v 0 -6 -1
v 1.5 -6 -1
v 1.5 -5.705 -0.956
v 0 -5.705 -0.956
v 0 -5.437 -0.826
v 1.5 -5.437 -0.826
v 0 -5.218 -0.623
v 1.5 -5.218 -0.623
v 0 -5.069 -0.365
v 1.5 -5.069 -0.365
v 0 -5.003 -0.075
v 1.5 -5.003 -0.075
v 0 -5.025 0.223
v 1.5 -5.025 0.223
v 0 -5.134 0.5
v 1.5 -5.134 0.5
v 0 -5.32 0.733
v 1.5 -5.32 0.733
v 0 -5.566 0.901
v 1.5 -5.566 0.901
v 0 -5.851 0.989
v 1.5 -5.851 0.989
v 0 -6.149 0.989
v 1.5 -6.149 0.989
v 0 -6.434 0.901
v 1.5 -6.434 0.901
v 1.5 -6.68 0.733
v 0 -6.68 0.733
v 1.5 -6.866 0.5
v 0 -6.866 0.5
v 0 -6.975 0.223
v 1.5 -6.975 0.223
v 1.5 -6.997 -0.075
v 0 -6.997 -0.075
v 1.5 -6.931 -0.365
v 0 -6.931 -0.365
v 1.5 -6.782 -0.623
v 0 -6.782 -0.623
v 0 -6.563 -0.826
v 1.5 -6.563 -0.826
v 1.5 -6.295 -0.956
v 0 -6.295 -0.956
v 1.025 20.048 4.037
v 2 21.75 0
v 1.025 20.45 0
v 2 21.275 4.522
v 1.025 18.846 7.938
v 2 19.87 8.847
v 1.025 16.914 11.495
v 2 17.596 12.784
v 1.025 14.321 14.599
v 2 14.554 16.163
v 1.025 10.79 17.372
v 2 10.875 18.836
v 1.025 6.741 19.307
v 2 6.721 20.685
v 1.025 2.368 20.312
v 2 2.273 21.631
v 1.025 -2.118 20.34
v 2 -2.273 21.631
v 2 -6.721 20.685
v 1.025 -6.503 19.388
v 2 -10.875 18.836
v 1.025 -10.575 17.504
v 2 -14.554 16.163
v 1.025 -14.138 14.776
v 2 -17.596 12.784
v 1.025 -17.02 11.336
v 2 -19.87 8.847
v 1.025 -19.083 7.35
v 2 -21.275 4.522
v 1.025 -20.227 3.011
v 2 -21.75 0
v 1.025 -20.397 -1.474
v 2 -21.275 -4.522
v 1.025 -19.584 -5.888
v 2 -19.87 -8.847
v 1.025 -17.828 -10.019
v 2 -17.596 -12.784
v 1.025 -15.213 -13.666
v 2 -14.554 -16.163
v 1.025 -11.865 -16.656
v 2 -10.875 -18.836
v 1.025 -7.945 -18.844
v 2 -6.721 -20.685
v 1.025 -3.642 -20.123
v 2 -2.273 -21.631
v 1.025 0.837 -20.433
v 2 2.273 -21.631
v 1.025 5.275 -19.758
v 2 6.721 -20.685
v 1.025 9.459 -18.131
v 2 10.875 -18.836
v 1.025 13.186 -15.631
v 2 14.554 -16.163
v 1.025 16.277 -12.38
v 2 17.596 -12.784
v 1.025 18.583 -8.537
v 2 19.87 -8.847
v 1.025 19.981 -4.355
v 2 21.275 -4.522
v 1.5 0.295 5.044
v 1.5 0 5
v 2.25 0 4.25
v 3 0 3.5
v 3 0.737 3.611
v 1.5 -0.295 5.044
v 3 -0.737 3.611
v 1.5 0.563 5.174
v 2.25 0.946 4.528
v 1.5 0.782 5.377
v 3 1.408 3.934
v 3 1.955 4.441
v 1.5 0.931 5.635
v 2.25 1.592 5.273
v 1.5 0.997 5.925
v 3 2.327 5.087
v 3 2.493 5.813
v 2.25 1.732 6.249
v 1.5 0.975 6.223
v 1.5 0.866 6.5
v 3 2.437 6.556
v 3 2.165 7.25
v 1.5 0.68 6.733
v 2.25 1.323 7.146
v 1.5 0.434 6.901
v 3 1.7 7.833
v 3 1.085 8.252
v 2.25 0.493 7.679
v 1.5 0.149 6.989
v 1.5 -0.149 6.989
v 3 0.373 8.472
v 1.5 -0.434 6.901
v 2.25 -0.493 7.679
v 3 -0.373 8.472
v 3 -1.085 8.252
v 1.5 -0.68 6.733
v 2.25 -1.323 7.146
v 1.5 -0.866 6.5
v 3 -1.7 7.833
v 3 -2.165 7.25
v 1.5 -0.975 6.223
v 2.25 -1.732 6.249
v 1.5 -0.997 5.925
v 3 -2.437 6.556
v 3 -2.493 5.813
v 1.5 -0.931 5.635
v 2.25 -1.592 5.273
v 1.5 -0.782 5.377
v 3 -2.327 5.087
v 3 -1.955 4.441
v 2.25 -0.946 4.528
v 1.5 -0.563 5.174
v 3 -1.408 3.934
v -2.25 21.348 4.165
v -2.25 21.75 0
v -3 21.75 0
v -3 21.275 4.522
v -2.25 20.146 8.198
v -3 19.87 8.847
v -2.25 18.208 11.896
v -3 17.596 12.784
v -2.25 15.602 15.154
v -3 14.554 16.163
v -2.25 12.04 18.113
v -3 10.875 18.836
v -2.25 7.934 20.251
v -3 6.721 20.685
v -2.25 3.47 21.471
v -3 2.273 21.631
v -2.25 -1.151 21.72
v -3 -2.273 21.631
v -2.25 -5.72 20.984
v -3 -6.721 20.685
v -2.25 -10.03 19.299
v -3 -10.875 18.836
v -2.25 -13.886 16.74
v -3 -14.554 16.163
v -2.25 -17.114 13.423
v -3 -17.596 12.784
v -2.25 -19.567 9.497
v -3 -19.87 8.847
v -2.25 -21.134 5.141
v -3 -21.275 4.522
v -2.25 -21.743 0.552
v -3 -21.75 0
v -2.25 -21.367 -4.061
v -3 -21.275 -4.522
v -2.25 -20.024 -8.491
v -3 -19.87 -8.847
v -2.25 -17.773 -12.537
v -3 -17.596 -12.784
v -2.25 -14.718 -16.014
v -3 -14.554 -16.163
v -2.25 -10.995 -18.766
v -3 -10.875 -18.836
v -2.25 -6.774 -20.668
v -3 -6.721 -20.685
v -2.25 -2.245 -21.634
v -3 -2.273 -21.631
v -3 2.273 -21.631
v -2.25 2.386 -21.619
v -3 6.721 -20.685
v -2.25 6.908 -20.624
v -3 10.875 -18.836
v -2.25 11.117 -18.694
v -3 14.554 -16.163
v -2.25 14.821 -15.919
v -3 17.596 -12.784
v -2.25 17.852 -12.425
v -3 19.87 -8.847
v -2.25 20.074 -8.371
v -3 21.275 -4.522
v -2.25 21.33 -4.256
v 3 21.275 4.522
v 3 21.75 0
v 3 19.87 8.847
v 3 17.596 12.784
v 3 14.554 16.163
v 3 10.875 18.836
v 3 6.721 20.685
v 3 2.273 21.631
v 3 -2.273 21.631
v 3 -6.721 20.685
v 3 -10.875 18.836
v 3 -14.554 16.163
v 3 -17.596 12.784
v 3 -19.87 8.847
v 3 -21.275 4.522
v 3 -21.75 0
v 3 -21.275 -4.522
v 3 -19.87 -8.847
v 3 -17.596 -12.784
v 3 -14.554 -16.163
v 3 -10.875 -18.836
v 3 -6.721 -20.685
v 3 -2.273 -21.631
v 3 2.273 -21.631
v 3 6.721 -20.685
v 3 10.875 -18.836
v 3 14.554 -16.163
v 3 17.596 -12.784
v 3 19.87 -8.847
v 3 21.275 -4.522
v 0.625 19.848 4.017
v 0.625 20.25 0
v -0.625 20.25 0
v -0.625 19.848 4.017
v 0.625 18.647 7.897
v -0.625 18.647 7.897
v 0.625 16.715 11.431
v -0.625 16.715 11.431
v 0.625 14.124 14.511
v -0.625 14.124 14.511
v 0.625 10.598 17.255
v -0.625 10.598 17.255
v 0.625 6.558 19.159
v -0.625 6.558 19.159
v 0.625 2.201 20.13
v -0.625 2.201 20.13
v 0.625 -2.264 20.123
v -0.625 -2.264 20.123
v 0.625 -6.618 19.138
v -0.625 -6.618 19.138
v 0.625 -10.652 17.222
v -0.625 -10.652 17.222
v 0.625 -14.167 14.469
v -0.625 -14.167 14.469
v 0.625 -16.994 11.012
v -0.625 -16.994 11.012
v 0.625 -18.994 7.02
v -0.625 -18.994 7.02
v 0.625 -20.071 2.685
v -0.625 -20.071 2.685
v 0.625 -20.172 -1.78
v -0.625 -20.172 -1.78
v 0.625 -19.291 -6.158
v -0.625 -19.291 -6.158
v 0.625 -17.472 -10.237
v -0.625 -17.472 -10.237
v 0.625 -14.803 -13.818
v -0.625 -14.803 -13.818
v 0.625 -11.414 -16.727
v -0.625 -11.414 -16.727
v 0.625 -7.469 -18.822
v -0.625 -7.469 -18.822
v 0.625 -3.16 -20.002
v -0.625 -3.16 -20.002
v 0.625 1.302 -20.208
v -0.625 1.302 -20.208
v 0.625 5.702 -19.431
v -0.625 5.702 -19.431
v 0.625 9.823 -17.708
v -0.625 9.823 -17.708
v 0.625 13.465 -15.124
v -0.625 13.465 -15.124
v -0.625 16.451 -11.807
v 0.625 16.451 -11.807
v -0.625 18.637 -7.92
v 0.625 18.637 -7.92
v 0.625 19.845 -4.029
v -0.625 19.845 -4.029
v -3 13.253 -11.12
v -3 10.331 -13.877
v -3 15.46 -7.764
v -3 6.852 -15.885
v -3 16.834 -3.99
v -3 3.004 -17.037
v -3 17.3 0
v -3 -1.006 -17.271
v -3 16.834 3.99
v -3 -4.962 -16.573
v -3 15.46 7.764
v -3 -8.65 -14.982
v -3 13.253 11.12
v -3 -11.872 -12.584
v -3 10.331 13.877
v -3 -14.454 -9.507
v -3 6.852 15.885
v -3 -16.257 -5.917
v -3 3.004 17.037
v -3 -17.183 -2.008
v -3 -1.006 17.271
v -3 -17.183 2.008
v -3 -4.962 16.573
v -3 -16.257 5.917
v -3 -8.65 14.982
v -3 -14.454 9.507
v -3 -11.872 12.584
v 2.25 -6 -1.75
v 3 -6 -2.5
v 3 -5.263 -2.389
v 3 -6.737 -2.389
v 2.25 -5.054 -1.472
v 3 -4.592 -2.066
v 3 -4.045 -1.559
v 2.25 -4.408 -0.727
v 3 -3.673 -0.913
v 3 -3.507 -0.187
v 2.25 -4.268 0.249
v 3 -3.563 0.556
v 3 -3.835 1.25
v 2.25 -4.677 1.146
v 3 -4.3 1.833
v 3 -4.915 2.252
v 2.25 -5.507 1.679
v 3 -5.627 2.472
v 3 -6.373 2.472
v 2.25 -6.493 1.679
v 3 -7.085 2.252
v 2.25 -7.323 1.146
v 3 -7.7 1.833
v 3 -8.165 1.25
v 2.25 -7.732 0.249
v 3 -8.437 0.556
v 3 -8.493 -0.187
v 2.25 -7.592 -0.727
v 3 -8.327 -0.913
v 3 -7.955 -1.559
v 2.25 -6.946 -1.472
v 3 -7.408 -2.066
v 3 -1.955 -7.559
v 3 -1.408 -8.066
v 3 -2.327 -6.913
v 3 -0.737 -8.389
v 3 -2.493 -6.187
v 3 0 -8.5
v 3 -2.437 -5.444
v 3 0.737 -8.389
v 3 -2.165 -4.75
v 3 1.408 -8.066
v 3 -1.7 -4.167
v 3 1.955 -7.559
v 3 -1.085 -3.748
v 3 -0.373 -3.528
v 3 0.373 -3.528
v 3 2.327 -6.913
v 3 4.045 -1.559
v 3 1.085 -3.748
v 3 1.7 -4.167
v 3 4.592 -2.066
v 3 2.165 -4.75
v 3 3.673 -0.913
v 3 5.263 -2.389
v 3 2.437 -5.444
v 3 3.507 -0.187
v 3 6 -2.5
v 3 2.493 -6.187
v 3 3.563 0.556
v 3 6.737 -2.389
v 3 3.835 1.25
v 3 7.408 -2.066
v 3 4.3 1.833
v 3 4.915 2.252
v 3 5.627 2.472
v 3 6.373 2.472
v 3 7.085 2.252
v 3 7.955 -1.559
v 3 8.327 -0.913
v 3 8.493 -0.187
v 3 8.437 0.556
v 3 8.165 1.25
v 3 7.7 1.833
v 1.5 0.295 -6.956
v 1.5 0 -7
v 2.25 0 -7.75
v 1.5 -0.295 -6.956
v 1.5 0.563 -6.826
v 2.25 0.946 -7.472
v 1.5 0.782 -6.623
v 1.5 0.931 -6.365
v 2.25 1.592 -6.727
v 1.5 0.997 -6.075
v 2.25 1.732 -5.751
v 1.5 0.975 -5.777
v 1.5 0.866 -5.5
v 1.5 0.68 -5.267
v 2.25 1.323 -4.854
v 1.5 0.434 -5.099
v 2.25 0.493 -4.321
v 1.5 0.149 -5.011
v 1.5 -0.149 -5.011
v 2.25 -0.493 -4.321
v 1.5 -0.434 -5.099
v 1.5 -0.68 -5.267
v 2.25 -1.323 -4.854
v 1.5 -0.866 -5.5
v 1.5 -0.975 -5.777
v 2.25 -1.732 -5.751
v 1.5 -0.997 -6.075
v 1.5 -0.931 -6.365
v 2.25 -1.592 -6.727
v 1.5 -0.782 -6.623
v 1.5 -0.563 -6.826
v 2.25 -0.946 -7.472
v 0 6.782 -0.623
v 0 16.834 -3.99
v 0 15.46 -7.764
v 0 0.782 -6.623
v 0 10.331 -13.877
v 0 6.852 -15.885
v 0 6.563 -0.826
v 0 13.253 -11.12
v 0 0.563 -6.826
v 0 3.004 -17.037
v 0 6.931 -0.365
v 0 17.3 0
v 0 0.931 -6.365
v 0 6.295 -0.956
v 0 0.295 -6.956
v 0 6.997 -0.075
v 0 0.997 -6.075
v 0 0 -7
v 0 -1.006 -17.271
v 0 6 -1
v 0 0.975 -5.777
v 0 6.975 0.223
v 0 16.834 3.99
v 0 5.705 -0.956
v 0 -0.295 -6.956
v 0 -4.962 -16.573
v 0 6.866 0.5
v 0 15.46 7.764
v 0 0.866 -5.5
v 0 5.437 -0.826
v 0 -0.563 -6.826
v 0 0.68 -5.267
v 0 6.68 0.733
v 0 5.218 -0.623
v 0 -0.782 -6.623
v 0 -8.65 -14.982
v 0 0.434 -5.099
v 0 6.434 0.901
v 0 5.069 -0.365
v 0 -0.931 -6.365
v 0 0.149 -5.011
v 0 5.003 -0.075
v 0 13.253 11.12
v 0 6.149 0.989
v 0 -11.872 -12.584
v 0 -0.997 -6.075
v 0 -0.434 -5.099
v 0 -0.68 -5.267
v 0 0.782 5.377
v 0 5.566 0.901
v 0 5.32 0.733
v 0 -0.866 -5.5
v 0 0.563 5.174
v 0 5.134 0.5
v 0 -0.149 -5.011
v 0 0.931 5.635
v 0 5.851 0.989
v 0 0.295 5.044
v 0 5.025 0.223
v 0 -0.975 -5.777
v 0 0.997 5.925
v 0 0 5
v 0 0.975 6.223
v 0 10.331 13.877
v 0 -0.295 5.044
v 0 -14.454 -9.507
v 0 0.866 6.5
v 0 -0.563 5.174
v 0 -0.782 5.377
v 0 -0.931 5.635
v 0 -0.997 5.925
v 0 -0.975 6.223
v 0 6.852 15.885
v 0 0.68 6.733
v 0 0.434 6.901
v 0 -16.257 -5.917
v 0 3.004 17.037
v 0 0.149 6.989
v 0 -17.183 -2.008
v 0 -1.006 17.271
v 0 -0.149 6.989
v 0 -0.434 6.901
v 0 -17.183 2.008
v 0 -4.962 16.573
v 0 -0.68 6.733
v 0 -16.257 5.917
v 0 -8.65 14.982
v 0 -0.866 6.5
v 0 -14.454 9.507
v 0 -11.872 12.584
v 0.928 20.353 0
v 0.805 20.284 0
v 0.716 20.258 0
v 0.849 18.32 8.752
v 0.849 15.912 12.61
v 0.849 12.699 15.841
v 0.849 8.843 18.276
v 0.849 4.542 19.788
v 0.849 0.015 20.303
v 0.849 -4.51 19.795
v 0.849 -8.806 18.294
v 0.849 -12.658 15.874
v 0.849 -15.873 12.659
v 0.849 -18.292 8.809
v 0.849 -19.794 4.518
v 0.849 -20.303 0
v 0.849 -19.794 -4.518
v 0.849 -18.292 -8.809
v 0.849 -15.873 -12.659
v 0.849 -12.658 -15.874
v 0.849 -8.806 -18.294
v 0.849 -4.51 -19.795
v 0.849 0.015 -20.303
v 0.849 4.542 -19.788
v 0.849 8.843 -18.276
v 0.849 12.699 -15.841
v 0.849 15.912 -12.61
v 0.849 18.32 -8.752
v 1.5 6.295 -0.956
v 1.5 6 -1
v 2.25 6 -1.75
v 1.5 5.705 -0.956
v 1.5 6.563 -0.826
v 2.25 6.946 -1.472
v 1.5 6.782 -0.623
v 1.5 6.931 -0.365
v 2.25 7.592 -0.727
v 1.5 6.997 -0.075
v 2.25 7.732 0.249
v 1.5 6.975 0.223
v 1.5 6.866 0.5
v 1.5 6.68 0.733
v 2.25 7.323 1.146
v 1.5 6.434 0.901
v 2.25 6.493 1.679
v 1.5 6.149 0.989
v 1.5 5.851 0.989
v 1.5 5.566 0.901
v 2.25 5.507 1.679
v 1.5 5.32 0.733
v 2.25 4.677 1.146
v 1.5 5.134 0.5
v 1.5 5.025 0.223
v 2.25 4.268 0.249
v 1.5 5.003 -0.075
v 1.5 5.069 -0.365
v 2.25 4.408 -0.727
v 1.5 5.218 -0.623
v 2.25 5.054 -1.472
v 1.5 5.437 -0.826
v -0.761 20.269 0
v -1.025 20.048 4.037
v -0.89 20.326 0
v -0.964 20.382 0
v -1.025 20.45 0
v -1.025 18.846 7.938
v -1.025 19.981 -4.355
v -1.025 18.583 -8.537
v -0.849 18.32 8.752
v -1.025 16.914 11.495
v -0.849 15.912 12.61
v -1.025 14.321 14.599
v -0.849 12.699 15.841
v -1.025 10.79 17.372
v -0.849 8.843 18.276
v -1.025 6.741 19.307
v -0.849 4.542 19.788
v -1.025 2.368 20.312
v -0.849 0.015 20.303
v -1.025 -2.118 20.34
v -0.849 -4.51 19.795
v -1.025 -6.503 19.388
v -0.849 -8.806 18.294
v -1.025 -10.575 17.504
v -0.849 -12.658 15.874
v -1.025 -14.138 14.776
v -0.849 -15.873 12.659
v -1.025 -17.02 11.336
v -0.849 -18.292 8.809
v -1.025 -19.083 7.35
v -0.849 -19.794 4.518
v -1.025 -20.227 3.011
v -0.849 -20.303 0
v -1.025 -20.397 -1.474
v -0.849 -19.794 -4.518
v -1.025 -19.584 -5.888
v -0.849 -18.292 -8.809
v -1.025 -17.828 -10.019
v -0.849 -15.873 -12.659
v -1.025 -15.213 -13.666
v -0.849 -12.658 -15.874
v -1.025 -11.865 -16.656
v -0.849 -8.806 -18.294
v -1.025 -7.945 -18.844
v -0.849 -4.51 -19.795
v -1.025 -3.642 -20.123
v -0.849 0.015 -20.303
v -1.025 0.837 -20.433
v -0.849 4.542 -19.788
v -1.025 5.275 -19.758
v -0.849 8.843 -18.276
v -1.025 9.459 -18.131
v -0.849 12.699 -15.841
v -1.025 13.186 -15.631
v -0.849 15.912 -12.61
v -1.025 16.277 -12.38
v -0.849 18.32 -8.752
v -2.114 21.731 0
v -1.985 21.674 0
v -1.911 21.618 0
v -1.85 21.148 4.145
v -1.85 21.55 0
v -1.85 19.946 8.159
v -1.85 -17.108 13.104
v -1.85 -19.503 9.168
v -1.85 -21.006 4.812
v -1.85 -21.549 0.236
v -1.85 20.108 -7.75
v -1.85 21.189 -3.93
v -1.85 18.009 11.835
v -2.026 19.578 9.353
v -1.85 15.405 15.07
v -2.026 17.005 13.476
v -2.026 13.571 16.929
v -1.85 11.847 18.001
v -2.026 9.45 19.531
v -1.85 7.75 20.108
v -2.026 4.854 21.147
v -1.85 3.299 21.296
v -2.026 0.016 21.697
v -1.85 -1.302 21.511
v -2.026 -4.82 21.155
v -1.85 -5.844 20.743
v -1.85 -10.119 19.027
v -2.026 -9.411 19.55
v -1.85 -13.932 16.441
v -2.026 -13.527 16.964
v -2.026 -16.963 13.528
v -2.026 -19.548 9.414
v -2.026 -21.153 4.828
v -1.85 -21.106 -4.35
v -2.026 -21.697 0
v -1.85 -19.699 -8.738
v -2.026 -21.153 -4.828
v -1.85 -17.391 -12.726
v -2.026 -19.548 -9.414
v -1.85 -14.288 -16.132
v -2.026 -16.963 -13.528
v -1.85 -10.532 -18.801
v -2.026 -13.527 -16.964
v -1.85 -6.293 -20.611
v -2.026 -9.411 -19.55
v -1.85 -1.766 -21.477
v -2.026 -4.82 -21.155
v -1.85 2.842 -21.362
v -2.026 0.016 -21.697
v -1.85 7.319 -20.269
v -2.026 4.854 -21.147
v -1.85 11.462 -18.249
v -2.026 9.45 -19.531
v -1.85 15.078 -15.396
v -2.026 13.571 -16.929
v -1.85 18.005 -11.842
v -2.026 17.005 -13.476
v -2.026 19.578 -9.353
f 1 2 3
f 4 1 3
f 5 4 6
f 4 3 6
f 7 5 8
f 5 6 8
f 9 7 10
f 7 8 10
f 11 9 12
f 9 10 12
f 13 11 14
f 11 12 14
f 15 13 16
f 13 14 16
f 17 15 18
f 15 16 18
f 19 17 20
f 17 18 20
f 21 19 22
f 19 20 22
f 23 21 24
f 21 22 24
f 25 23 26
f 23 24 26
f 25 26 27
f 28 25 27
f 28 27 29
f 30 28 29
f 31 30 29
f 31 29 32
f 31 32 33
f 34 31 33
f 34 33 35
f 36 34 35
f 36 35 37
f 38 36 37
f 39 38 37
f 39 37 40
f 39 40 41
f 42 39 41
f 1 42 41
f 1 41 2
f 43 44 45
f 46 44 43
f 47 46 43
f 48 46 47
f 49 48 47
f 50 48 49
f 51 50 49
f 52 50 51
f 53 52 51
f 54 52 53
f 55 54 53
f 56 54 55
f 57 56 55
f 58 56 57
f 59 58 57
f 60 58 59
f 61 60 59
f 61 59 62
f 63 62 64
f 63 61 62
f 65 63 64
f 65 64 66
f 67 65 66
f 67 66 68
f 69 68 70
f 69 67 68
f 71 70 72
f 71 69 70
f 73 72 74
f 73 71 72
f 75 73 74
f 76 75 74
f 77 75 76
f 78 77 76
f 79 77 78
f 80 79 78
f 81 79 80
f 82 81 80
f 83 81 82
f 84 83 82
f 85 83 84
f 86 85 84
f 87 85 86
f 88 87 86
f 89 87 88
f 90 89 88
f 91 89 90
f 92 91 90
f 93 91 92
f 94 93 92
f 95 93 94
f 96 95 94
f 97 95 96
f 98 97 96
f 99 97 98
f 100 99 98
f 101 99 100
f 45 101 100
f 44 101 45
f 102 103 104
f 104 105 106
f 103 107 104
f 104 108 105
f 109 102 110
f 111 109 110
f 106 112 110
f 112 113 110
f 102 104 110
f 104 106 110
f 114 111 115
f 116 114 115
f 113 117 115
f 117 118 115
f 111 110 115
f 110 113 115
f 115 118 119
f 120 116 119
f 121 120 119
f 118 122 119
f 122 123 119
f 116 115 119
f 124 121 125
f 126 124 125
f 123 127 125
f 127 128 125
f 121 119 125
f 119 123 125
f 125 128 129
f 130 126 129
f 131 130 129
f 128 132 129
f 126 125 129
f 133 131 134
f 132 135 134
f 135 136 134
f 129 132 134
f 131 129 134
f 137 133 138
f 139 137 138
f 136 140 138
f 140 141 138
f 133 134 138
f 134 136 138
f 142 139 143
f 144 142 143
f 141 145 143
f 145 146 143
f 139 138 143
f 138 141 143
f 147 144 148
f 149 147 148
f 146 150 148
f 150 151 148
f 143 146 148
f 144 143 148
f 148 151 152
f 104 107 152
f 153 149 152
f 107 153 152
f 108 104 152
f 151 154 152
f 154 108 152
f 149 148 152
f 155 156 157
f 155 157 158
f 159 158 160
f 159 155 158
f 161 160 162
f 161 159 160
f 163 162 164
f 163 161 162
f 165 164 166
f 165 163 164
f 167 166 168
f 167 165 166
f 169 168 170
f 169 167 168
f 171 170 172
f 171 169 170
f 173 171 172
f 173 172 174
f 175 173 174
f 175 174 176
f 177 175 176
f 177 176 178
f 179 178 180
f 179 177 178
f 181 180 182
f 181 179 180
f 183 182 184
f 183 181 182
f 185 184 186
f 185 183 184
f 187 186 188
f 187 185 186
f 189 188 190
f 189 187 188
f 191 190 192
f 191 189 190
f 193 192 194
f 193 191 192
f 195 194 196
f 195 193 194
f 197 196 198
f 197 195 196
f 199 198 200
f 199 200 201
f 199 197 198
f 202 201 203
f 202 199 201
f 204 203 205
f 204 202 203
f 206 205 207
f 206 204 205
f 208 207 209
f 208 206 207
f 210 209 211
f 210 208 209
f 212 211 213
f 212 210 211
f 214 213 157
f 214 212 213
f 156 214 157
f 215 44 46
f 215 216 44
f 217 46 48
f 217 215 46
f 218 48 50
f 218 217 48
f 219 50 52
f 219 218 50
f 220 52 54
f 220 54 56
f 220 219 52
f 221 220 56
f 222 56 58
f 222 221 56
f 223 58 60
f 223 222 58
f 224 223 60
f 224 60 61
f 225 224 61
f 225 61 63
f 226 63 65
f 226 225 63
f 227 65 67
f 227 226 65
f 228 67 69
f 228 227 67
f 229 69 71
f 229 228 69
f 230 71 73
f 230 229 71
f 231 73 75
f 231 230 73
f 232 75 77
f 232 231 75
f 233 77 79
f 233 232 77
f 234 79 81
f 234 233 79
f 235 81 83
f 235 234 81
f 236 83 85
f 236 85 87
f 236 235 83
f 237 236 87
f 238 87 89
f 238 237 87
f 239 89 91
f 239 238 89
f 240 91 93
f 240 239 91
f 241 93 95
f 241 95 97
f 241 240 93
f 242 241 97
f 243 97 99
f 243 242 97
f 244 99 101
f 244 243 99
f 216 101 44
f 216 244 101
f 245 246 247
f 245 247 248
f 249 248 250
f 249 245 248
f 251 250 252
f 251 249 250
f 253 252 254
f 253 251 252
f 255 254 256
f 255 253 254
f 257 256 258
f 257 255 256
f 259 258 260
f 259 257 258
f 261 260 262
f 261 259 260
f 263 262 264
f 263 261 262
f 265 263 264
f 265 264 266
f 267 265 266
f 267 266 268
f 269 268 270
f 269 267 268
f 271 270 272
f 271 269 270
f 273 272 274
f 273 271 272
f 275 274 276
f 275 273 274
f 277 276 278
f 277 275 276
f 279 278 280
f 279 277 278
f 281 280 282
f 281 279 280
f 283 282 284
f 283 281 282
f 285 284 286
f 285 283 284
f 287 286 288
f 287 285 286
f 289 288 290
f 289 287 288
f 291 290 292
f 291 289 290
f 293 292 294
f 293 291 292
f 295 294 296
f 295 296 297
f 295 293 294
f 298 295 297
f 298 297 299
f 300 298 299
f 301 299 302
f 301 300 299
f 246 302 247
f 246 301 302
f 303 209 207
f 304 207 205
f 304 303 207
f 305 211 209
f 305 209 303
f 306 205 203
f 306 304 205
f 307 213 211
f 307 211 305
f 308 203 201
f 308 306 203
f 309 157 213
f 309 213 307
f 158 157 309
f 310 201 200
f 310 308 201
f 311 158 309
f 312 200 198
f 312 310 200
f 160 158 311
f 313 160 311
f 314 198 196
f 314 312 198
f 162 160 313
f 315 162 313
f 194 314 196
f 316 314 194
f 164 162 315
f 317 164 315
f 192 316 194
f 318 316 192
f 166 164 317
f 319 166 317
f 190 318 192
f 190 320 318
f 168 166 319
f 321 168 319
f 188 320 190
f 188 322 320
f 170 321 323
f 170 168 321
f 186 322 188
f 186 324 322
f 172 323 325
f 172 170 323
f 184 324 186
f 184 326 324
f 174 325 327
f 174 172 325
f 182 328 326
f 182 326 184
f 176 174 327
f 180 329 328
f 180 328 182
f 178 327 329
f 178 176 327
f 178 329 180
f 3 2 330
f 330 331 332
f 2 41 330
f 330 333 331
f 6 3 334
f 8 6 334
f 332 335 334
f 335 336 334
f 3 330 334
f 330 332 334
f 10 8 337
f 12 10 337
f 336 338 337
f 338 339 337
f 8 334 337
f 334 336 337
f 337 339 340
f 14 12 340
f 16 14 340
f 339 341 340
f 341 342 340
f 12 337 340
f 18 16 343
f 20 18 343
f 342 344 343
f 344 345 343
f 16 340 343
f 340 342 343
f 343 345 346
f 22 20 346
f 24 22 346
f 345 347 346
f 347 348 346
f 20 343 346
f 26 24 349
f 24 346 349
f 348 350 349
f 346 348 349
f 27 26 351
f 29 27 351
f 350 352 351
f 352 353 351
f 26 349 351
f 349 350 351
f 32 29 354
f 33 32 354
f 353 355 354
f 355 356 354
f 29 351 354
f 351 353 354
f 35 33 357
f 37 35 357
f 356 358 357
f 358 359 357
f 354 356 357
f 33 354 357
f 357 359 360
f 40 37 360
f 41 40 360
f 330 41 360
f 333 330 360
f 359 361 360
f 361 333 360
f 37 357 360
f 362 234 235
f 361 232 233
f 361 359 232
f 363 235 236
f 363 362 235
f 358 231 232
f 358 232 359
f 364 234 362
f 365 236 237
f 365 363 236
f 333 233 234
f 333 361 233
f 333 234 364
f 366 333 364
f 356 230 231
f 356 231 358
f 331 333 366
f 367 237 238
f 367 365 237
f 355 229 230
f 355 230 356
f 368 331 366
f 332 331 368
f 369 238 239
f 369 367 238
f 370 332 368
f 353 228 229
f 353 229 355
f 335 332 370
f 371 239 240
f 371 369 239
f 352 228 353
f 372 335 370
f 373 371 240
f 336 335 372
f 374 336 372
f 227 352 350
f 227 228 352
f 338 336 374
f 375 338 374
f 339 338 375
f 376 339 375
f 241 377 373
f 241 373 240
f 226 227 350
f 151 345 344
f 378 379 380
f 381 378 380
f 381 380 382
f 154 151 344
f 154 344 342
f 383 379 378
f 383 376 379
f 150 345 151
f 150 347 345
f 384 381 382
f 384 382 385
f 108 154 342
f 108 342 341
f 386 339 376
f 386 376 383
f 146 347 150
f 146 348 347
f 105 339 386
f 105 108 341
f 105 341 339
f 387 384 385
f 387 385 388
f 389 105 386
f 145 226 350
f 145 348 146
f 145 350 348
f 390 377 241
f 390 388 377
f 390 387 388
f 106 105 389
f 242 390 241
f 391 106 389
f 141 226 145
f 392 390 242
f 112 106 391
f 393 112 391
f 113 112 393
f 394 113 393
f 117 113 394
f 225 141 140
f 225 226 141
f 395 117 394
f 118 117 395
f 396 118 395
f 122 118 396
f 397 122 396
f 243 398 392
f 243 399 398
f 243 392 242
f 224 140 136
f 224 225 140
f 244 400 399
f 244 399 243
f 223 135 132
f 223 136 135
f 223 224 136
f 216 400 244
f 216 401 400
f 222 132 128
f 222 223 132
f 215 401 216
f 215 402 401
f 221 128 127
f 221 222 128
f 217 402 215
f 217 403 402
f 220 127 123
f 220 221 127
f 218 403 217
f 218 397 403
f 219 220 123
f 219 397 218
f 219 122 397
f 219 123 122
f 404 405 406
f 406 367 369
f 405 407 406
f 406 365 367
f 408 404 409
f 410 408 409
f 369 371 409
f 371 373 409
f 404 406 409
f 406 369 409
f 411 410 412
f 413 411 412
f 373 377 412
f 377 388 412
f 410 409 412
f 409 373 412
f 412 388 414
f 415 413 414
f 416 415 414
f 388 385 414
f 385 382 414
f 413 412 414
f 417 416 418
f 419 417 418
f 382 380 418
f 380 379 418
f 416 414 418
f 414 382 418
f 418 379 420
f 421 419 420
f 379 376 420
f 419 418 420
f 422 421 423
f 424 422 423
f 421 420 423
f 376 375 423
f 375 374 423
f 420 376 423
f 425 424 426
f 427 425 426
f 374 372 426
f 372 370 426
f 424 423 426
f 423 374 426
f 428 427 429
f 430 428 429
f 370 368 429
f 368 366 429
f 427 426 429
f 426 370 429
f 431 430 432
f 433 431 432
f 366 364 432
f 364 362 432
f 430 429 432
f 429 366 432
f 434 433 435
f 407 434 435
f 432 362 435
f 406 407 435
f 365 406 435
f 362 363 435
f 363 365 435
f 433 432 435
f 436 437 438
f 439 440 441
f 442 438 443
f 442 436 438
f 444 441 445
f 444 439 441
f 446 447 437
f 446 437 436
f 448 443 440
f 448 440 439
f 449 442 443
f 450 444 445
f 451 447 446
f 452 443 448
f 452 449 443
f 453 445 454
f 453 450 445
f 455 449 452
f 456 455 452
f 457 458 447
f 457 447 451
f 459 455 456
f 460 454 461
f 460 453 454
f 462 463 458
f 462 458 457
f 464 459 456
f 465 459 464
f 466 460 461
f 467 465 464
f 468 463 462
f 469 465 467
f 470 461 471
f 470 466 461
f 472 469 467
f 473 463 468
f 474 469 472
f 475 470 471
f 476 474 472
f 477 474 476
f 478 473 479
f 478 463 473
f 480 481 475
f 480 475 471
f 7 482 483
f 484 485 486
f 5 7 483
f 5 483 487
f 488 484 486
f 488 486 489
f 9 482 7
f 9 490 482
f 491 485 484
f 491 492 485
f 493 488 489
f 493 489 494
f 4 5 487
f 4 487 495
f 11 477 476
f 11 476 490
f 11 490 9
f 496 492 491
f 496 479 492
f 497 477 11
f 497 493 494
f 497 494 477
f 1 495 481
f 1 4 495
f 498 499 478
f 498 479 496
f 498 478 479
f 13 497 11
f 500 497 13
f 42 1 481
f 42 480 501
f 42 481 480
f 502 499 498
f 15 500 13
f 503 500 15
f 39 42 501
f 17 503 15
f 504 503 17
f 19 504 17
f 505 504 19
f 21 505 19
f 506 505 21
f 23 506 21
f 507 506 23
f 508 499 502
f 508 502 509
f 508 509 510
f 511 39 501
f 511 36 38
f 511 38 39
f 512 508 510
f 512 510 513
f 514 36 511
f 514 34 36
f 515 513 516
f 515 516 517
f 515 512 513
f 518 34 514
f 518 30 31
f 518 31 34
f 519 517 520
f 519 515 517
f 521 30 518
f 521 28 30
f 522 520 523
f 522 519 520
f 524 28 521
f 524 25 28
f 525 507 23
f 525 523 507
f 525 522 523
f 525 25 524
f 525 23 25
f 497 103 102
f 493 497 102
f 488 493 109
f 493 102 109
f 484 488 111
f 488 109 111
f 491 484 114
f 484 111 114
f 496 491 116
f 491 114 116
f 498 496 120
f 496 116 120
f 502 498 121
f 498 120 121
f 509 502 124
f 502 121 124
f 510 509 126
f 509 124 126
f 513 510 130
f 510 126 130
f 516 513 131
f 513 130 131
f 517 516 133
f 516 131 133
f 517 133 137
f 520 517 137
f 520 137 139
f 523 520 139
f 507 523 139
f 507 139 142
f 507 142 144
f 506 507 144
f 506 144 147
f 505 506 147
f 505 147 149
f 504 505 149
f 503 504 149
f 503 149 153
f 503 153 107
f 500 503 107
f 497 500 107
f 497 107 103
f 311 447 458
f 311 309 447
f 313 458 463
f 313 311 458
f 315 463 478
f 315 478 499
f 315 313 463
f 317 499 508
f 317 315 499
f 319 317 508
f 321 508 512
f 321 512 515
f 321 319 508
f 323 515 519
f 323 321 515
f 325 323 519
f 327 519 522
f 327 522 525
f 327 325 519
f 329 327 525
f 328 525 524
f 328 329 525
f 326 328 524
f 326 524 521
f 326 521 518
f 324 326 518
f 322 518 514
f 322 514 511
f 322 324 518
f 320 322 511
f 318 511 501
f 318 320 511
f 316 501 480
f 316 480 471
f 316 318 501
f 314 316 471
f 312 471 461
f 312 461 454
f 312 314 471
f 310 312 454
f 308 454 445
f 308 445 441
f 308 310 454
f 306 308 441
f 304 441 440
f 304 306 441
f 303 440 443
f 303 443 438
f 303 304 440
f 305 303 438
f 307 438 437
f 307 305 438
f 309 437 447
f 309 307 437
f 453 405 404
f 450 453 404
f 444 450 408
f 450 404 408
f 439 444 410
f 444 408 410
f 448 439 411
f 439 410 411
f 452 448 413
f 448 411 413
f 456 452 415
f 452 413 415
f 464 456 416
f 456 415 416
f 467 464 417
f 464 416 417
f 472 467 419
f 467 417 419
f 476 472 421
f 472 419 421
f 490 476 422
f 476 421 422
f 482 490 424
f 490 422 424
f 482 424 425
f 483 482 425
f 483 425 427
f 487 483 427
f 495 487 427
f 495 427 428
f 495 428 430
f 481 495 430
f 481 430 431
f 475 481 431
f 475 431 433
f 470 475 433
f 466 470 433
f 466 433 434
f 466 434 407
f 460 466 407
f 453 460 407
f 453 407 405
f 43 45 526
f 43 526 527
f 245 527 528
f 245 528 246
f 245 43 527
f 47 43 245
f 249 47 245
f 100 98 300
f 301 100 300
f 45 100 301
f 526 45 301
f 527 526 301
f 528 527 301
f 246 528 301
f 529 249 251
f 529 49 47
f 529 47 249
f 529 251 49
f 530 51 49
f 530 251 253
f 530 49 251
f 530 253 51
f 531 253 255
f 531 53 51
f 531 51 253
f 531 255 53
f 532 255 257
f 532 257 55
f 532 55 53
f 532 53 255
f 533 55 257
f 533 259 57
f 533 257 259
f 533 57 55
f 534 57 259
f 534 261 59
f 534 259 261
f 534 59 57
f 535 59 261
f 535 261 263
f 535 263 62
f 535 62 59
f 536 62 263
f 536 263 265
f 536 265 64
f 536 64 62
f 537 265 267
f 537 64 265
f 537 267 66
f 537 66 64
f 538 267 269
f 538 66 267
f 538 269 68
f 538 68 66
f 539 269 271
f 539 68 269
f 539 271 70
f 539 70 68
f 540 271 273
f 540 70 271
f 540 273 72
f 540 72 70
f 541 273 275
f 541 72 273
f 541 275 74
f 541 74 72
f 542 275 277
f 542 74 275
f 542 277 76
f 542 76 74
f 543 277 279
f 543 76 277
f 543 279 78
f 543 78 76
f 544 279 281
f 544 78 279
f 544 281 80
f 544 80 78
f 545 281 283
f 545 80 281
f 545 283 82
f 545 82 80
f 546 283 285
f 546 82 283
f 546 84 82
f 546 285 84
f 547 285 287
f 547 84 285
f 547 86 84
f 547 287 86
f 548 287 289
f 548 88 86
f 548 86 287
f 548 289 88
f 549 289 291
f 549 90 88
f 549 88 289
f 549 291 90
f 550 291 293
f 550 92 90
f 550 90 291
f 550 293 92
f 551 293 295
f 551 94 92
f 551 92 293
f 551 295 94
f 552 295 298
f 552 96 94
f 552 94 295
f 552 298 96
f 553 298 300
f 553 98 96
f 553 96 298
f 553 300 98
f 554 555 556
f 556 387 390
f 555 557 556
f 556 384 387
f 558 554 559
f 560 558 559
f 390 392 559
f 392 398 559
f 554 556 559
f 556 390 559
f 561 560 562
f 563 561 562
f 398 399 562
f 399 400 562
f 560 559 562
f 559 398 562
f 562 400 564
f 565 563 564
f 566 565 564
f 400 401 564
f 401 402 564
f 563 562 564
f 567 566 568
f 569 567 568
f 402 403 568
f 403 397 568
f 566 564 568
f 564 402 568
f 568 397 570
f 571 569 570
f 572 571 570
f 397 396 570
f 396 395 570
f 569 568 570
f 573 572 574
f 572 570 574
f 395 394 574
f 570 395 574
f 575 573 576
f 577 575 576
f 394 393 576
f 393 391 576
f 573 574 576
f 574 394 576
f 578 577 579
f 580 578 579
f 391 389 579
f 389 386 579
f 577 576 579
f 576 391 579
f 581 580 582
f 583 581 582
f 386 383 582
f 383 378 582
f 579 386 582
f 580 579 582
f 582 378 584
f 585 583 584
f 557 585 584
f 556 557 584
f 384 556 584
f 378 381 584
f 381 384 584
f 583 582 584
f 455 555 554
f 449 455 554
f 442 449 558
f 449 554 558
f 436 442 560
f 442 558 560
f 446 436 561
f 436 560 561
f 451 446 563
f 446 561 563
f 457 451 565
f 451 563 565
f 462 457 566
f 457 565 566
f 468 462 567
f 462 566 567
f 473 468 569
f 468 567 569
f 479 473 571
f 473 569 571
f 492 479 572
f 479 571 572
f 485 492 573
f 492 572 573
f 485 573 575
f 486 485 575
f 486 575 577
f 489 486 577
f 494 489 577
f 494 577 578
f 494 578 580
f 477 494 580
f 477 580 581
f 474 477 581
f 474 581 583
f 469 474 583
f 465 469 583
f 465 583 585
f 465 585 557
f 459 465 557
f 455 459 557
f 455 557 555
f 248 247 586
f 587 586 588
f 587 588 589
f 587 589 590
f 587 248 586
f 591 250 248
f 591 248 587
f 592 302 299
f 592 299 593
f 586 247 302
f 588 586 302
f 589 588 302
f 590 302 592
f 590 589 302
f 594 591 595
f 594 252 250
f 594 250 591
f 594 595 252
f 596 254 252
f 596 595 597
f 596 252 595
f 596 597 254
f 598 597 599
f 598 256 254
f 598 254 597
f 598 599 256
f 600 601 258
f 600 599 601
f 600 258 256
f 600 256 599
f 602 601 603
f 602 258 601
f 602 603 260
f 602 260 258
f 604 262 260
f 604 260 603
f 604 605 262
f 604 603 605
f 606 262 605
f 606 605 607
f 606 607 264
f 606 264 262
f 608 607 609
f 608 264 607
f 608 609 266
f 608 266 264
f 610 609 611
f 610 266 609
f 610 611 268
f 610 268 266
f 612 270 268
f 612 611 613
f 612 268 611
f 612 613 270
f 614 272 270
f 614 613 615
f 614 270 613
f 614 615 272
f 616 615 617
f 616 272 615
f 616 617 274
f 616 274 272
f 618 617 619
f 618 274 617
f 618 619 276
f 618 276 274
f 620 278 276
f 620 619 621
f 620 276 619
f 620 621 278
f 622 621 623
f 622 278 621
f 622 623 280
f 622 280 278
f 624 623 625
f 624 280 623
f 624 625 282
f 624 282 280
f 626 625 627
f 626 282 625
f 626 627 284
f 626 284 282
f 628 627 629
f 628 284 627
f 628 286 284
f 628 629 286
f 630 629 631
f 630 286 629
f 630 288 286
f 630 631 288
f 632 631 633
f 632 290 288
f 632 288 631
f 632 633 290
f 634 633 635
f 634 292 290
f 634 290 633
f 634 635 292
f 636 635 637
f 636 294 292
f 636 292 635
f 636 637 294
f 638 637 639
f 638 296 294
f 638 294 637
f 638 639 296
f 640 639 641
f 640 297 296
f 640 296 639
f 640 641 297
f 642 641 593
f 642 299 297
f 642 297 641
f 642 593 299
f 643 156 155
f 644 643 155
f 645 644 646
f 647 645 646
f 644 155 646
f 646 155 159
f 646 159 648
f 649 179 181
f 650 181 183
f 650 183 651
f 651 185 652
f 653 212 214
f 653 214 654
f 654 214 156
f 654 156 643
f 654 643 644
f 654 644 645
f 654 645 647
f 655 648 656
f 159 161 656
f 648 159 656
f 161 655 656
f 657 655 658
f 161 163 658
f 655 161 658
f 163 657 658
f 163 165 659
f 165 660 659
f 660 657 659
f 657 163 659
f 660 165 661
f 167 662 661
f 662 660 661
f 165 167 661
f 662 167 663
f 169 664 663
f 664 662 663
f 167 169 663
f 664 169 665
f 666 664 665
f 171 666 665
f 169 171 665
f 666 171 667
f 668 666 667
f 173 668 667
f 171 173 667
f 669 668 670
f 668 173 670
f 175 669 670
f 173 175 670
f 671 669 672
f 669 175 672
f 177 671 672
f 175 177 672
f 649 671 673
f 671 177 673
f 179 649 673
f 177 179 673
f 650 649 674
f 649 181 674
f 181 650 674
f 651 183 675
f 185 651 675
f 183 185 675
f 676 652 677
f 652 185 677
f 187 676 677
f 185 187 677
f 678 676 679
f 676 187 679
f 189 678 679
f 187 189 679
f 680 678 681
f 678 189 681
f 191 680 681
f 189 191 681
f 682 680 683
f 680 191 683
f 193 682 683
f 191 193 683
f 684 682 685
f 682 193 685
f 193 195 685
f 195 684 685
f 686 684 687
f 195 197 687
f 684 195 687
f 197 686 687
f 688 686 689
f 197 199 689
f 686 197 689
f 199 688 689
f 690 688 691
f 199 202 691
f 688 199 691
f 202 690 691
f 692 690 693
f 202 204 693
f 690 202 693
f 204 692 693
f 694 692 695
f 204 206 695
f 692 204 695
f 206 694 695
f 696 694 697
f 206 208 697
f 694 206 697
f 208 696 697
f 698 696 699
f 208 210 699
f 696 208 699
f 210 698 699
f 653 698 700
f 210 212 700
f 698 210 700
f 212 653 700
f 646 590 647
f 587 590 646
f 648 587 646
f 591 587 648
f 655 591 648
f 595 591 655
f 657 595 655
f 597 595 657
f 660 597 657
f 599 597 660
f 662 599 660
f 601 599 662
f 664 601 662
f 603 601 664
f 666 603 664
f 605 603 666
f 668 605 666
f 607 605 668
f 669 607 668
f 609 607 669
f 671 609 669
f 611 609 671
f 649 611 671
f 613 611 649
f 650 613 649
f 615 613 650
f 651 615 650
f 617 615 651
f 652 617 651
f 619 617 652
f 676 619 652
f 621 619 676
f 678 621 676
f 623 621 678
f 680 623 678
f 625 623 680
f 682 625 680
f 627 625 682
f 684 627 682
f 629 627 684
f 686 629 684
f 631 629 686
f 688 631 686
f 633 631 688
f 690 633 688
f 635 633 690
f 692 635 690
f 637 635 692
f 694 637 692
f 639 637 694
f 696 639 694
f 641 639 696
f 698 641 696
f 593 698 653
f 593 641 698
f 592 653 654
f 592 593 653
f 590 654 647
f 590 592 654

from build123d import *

# Parameters (mm, degrees)
SCHIZZO2_R               = 1
TAGLIO_ESTRUSIONE1_DEPTH = 10
SMUSSO1_SIZE             = 1.5
RACCORDO1_R              = 0.5


with BuildPart() as part:
    # Schizzo1 → Rivoluzione1 (revolve)
    with BuildSketch(Plane.XY):
        Polygon((0, 0), (0, 17.3), (-3, 17.3), (-3, 21.75), (-2, 21.75), (-0.875, 20.25), (0.875, 20.25), (2, 21.75), (3, 21.75), (3, 0), align=None)
    revolve(axis=Axis((0, 0, 0), (1, 0, 0)))

    # Schizzo2 → Taglio-Estrusione1 (cut)
    with BuildSketch(Plane(origin=(3, 0, 0), x_dir=(0, 0, -1), z_dir=(1, 0, 0))):
        with Locations((0, 6)):
            Circle(SCHIZZO2_R)
        with Locations((6, 0)):
            Circle(SCHIZZO2_R)
        with Locations((0, -6)):
            Circle(SCHIZZO2_R)
        with Locations((-6, 0)):
            Circle(SCHIZZO2_R)
    extrude(amount=-TAGLIO_ESTRUSIONE1_DEPTH, mode=Mode.SUBTRACT)

    # Smusso1
    smusso1_edges = [part.edges().sort_by_distance(p)[0] for p in [
        (3, 6, 1),
        (3, 0, -5),
        (3, -6, 1),
        (3, 0, 7),
    ]]
    chamfer(smusso1_edges, length=SMUSSO1_SIZE)

    # Raccordo1
    raccordo1_edges = [part.edges().sort_by_distance(p)[0] for p in [
        (-2, -21.75, 0),
        (0.875, -20.25, 0),
        (-0.875, -20.25, 0),
    ]]
    fillet(raccordo1_edges, radius=RACCORDO1_R)


solid = part.part
